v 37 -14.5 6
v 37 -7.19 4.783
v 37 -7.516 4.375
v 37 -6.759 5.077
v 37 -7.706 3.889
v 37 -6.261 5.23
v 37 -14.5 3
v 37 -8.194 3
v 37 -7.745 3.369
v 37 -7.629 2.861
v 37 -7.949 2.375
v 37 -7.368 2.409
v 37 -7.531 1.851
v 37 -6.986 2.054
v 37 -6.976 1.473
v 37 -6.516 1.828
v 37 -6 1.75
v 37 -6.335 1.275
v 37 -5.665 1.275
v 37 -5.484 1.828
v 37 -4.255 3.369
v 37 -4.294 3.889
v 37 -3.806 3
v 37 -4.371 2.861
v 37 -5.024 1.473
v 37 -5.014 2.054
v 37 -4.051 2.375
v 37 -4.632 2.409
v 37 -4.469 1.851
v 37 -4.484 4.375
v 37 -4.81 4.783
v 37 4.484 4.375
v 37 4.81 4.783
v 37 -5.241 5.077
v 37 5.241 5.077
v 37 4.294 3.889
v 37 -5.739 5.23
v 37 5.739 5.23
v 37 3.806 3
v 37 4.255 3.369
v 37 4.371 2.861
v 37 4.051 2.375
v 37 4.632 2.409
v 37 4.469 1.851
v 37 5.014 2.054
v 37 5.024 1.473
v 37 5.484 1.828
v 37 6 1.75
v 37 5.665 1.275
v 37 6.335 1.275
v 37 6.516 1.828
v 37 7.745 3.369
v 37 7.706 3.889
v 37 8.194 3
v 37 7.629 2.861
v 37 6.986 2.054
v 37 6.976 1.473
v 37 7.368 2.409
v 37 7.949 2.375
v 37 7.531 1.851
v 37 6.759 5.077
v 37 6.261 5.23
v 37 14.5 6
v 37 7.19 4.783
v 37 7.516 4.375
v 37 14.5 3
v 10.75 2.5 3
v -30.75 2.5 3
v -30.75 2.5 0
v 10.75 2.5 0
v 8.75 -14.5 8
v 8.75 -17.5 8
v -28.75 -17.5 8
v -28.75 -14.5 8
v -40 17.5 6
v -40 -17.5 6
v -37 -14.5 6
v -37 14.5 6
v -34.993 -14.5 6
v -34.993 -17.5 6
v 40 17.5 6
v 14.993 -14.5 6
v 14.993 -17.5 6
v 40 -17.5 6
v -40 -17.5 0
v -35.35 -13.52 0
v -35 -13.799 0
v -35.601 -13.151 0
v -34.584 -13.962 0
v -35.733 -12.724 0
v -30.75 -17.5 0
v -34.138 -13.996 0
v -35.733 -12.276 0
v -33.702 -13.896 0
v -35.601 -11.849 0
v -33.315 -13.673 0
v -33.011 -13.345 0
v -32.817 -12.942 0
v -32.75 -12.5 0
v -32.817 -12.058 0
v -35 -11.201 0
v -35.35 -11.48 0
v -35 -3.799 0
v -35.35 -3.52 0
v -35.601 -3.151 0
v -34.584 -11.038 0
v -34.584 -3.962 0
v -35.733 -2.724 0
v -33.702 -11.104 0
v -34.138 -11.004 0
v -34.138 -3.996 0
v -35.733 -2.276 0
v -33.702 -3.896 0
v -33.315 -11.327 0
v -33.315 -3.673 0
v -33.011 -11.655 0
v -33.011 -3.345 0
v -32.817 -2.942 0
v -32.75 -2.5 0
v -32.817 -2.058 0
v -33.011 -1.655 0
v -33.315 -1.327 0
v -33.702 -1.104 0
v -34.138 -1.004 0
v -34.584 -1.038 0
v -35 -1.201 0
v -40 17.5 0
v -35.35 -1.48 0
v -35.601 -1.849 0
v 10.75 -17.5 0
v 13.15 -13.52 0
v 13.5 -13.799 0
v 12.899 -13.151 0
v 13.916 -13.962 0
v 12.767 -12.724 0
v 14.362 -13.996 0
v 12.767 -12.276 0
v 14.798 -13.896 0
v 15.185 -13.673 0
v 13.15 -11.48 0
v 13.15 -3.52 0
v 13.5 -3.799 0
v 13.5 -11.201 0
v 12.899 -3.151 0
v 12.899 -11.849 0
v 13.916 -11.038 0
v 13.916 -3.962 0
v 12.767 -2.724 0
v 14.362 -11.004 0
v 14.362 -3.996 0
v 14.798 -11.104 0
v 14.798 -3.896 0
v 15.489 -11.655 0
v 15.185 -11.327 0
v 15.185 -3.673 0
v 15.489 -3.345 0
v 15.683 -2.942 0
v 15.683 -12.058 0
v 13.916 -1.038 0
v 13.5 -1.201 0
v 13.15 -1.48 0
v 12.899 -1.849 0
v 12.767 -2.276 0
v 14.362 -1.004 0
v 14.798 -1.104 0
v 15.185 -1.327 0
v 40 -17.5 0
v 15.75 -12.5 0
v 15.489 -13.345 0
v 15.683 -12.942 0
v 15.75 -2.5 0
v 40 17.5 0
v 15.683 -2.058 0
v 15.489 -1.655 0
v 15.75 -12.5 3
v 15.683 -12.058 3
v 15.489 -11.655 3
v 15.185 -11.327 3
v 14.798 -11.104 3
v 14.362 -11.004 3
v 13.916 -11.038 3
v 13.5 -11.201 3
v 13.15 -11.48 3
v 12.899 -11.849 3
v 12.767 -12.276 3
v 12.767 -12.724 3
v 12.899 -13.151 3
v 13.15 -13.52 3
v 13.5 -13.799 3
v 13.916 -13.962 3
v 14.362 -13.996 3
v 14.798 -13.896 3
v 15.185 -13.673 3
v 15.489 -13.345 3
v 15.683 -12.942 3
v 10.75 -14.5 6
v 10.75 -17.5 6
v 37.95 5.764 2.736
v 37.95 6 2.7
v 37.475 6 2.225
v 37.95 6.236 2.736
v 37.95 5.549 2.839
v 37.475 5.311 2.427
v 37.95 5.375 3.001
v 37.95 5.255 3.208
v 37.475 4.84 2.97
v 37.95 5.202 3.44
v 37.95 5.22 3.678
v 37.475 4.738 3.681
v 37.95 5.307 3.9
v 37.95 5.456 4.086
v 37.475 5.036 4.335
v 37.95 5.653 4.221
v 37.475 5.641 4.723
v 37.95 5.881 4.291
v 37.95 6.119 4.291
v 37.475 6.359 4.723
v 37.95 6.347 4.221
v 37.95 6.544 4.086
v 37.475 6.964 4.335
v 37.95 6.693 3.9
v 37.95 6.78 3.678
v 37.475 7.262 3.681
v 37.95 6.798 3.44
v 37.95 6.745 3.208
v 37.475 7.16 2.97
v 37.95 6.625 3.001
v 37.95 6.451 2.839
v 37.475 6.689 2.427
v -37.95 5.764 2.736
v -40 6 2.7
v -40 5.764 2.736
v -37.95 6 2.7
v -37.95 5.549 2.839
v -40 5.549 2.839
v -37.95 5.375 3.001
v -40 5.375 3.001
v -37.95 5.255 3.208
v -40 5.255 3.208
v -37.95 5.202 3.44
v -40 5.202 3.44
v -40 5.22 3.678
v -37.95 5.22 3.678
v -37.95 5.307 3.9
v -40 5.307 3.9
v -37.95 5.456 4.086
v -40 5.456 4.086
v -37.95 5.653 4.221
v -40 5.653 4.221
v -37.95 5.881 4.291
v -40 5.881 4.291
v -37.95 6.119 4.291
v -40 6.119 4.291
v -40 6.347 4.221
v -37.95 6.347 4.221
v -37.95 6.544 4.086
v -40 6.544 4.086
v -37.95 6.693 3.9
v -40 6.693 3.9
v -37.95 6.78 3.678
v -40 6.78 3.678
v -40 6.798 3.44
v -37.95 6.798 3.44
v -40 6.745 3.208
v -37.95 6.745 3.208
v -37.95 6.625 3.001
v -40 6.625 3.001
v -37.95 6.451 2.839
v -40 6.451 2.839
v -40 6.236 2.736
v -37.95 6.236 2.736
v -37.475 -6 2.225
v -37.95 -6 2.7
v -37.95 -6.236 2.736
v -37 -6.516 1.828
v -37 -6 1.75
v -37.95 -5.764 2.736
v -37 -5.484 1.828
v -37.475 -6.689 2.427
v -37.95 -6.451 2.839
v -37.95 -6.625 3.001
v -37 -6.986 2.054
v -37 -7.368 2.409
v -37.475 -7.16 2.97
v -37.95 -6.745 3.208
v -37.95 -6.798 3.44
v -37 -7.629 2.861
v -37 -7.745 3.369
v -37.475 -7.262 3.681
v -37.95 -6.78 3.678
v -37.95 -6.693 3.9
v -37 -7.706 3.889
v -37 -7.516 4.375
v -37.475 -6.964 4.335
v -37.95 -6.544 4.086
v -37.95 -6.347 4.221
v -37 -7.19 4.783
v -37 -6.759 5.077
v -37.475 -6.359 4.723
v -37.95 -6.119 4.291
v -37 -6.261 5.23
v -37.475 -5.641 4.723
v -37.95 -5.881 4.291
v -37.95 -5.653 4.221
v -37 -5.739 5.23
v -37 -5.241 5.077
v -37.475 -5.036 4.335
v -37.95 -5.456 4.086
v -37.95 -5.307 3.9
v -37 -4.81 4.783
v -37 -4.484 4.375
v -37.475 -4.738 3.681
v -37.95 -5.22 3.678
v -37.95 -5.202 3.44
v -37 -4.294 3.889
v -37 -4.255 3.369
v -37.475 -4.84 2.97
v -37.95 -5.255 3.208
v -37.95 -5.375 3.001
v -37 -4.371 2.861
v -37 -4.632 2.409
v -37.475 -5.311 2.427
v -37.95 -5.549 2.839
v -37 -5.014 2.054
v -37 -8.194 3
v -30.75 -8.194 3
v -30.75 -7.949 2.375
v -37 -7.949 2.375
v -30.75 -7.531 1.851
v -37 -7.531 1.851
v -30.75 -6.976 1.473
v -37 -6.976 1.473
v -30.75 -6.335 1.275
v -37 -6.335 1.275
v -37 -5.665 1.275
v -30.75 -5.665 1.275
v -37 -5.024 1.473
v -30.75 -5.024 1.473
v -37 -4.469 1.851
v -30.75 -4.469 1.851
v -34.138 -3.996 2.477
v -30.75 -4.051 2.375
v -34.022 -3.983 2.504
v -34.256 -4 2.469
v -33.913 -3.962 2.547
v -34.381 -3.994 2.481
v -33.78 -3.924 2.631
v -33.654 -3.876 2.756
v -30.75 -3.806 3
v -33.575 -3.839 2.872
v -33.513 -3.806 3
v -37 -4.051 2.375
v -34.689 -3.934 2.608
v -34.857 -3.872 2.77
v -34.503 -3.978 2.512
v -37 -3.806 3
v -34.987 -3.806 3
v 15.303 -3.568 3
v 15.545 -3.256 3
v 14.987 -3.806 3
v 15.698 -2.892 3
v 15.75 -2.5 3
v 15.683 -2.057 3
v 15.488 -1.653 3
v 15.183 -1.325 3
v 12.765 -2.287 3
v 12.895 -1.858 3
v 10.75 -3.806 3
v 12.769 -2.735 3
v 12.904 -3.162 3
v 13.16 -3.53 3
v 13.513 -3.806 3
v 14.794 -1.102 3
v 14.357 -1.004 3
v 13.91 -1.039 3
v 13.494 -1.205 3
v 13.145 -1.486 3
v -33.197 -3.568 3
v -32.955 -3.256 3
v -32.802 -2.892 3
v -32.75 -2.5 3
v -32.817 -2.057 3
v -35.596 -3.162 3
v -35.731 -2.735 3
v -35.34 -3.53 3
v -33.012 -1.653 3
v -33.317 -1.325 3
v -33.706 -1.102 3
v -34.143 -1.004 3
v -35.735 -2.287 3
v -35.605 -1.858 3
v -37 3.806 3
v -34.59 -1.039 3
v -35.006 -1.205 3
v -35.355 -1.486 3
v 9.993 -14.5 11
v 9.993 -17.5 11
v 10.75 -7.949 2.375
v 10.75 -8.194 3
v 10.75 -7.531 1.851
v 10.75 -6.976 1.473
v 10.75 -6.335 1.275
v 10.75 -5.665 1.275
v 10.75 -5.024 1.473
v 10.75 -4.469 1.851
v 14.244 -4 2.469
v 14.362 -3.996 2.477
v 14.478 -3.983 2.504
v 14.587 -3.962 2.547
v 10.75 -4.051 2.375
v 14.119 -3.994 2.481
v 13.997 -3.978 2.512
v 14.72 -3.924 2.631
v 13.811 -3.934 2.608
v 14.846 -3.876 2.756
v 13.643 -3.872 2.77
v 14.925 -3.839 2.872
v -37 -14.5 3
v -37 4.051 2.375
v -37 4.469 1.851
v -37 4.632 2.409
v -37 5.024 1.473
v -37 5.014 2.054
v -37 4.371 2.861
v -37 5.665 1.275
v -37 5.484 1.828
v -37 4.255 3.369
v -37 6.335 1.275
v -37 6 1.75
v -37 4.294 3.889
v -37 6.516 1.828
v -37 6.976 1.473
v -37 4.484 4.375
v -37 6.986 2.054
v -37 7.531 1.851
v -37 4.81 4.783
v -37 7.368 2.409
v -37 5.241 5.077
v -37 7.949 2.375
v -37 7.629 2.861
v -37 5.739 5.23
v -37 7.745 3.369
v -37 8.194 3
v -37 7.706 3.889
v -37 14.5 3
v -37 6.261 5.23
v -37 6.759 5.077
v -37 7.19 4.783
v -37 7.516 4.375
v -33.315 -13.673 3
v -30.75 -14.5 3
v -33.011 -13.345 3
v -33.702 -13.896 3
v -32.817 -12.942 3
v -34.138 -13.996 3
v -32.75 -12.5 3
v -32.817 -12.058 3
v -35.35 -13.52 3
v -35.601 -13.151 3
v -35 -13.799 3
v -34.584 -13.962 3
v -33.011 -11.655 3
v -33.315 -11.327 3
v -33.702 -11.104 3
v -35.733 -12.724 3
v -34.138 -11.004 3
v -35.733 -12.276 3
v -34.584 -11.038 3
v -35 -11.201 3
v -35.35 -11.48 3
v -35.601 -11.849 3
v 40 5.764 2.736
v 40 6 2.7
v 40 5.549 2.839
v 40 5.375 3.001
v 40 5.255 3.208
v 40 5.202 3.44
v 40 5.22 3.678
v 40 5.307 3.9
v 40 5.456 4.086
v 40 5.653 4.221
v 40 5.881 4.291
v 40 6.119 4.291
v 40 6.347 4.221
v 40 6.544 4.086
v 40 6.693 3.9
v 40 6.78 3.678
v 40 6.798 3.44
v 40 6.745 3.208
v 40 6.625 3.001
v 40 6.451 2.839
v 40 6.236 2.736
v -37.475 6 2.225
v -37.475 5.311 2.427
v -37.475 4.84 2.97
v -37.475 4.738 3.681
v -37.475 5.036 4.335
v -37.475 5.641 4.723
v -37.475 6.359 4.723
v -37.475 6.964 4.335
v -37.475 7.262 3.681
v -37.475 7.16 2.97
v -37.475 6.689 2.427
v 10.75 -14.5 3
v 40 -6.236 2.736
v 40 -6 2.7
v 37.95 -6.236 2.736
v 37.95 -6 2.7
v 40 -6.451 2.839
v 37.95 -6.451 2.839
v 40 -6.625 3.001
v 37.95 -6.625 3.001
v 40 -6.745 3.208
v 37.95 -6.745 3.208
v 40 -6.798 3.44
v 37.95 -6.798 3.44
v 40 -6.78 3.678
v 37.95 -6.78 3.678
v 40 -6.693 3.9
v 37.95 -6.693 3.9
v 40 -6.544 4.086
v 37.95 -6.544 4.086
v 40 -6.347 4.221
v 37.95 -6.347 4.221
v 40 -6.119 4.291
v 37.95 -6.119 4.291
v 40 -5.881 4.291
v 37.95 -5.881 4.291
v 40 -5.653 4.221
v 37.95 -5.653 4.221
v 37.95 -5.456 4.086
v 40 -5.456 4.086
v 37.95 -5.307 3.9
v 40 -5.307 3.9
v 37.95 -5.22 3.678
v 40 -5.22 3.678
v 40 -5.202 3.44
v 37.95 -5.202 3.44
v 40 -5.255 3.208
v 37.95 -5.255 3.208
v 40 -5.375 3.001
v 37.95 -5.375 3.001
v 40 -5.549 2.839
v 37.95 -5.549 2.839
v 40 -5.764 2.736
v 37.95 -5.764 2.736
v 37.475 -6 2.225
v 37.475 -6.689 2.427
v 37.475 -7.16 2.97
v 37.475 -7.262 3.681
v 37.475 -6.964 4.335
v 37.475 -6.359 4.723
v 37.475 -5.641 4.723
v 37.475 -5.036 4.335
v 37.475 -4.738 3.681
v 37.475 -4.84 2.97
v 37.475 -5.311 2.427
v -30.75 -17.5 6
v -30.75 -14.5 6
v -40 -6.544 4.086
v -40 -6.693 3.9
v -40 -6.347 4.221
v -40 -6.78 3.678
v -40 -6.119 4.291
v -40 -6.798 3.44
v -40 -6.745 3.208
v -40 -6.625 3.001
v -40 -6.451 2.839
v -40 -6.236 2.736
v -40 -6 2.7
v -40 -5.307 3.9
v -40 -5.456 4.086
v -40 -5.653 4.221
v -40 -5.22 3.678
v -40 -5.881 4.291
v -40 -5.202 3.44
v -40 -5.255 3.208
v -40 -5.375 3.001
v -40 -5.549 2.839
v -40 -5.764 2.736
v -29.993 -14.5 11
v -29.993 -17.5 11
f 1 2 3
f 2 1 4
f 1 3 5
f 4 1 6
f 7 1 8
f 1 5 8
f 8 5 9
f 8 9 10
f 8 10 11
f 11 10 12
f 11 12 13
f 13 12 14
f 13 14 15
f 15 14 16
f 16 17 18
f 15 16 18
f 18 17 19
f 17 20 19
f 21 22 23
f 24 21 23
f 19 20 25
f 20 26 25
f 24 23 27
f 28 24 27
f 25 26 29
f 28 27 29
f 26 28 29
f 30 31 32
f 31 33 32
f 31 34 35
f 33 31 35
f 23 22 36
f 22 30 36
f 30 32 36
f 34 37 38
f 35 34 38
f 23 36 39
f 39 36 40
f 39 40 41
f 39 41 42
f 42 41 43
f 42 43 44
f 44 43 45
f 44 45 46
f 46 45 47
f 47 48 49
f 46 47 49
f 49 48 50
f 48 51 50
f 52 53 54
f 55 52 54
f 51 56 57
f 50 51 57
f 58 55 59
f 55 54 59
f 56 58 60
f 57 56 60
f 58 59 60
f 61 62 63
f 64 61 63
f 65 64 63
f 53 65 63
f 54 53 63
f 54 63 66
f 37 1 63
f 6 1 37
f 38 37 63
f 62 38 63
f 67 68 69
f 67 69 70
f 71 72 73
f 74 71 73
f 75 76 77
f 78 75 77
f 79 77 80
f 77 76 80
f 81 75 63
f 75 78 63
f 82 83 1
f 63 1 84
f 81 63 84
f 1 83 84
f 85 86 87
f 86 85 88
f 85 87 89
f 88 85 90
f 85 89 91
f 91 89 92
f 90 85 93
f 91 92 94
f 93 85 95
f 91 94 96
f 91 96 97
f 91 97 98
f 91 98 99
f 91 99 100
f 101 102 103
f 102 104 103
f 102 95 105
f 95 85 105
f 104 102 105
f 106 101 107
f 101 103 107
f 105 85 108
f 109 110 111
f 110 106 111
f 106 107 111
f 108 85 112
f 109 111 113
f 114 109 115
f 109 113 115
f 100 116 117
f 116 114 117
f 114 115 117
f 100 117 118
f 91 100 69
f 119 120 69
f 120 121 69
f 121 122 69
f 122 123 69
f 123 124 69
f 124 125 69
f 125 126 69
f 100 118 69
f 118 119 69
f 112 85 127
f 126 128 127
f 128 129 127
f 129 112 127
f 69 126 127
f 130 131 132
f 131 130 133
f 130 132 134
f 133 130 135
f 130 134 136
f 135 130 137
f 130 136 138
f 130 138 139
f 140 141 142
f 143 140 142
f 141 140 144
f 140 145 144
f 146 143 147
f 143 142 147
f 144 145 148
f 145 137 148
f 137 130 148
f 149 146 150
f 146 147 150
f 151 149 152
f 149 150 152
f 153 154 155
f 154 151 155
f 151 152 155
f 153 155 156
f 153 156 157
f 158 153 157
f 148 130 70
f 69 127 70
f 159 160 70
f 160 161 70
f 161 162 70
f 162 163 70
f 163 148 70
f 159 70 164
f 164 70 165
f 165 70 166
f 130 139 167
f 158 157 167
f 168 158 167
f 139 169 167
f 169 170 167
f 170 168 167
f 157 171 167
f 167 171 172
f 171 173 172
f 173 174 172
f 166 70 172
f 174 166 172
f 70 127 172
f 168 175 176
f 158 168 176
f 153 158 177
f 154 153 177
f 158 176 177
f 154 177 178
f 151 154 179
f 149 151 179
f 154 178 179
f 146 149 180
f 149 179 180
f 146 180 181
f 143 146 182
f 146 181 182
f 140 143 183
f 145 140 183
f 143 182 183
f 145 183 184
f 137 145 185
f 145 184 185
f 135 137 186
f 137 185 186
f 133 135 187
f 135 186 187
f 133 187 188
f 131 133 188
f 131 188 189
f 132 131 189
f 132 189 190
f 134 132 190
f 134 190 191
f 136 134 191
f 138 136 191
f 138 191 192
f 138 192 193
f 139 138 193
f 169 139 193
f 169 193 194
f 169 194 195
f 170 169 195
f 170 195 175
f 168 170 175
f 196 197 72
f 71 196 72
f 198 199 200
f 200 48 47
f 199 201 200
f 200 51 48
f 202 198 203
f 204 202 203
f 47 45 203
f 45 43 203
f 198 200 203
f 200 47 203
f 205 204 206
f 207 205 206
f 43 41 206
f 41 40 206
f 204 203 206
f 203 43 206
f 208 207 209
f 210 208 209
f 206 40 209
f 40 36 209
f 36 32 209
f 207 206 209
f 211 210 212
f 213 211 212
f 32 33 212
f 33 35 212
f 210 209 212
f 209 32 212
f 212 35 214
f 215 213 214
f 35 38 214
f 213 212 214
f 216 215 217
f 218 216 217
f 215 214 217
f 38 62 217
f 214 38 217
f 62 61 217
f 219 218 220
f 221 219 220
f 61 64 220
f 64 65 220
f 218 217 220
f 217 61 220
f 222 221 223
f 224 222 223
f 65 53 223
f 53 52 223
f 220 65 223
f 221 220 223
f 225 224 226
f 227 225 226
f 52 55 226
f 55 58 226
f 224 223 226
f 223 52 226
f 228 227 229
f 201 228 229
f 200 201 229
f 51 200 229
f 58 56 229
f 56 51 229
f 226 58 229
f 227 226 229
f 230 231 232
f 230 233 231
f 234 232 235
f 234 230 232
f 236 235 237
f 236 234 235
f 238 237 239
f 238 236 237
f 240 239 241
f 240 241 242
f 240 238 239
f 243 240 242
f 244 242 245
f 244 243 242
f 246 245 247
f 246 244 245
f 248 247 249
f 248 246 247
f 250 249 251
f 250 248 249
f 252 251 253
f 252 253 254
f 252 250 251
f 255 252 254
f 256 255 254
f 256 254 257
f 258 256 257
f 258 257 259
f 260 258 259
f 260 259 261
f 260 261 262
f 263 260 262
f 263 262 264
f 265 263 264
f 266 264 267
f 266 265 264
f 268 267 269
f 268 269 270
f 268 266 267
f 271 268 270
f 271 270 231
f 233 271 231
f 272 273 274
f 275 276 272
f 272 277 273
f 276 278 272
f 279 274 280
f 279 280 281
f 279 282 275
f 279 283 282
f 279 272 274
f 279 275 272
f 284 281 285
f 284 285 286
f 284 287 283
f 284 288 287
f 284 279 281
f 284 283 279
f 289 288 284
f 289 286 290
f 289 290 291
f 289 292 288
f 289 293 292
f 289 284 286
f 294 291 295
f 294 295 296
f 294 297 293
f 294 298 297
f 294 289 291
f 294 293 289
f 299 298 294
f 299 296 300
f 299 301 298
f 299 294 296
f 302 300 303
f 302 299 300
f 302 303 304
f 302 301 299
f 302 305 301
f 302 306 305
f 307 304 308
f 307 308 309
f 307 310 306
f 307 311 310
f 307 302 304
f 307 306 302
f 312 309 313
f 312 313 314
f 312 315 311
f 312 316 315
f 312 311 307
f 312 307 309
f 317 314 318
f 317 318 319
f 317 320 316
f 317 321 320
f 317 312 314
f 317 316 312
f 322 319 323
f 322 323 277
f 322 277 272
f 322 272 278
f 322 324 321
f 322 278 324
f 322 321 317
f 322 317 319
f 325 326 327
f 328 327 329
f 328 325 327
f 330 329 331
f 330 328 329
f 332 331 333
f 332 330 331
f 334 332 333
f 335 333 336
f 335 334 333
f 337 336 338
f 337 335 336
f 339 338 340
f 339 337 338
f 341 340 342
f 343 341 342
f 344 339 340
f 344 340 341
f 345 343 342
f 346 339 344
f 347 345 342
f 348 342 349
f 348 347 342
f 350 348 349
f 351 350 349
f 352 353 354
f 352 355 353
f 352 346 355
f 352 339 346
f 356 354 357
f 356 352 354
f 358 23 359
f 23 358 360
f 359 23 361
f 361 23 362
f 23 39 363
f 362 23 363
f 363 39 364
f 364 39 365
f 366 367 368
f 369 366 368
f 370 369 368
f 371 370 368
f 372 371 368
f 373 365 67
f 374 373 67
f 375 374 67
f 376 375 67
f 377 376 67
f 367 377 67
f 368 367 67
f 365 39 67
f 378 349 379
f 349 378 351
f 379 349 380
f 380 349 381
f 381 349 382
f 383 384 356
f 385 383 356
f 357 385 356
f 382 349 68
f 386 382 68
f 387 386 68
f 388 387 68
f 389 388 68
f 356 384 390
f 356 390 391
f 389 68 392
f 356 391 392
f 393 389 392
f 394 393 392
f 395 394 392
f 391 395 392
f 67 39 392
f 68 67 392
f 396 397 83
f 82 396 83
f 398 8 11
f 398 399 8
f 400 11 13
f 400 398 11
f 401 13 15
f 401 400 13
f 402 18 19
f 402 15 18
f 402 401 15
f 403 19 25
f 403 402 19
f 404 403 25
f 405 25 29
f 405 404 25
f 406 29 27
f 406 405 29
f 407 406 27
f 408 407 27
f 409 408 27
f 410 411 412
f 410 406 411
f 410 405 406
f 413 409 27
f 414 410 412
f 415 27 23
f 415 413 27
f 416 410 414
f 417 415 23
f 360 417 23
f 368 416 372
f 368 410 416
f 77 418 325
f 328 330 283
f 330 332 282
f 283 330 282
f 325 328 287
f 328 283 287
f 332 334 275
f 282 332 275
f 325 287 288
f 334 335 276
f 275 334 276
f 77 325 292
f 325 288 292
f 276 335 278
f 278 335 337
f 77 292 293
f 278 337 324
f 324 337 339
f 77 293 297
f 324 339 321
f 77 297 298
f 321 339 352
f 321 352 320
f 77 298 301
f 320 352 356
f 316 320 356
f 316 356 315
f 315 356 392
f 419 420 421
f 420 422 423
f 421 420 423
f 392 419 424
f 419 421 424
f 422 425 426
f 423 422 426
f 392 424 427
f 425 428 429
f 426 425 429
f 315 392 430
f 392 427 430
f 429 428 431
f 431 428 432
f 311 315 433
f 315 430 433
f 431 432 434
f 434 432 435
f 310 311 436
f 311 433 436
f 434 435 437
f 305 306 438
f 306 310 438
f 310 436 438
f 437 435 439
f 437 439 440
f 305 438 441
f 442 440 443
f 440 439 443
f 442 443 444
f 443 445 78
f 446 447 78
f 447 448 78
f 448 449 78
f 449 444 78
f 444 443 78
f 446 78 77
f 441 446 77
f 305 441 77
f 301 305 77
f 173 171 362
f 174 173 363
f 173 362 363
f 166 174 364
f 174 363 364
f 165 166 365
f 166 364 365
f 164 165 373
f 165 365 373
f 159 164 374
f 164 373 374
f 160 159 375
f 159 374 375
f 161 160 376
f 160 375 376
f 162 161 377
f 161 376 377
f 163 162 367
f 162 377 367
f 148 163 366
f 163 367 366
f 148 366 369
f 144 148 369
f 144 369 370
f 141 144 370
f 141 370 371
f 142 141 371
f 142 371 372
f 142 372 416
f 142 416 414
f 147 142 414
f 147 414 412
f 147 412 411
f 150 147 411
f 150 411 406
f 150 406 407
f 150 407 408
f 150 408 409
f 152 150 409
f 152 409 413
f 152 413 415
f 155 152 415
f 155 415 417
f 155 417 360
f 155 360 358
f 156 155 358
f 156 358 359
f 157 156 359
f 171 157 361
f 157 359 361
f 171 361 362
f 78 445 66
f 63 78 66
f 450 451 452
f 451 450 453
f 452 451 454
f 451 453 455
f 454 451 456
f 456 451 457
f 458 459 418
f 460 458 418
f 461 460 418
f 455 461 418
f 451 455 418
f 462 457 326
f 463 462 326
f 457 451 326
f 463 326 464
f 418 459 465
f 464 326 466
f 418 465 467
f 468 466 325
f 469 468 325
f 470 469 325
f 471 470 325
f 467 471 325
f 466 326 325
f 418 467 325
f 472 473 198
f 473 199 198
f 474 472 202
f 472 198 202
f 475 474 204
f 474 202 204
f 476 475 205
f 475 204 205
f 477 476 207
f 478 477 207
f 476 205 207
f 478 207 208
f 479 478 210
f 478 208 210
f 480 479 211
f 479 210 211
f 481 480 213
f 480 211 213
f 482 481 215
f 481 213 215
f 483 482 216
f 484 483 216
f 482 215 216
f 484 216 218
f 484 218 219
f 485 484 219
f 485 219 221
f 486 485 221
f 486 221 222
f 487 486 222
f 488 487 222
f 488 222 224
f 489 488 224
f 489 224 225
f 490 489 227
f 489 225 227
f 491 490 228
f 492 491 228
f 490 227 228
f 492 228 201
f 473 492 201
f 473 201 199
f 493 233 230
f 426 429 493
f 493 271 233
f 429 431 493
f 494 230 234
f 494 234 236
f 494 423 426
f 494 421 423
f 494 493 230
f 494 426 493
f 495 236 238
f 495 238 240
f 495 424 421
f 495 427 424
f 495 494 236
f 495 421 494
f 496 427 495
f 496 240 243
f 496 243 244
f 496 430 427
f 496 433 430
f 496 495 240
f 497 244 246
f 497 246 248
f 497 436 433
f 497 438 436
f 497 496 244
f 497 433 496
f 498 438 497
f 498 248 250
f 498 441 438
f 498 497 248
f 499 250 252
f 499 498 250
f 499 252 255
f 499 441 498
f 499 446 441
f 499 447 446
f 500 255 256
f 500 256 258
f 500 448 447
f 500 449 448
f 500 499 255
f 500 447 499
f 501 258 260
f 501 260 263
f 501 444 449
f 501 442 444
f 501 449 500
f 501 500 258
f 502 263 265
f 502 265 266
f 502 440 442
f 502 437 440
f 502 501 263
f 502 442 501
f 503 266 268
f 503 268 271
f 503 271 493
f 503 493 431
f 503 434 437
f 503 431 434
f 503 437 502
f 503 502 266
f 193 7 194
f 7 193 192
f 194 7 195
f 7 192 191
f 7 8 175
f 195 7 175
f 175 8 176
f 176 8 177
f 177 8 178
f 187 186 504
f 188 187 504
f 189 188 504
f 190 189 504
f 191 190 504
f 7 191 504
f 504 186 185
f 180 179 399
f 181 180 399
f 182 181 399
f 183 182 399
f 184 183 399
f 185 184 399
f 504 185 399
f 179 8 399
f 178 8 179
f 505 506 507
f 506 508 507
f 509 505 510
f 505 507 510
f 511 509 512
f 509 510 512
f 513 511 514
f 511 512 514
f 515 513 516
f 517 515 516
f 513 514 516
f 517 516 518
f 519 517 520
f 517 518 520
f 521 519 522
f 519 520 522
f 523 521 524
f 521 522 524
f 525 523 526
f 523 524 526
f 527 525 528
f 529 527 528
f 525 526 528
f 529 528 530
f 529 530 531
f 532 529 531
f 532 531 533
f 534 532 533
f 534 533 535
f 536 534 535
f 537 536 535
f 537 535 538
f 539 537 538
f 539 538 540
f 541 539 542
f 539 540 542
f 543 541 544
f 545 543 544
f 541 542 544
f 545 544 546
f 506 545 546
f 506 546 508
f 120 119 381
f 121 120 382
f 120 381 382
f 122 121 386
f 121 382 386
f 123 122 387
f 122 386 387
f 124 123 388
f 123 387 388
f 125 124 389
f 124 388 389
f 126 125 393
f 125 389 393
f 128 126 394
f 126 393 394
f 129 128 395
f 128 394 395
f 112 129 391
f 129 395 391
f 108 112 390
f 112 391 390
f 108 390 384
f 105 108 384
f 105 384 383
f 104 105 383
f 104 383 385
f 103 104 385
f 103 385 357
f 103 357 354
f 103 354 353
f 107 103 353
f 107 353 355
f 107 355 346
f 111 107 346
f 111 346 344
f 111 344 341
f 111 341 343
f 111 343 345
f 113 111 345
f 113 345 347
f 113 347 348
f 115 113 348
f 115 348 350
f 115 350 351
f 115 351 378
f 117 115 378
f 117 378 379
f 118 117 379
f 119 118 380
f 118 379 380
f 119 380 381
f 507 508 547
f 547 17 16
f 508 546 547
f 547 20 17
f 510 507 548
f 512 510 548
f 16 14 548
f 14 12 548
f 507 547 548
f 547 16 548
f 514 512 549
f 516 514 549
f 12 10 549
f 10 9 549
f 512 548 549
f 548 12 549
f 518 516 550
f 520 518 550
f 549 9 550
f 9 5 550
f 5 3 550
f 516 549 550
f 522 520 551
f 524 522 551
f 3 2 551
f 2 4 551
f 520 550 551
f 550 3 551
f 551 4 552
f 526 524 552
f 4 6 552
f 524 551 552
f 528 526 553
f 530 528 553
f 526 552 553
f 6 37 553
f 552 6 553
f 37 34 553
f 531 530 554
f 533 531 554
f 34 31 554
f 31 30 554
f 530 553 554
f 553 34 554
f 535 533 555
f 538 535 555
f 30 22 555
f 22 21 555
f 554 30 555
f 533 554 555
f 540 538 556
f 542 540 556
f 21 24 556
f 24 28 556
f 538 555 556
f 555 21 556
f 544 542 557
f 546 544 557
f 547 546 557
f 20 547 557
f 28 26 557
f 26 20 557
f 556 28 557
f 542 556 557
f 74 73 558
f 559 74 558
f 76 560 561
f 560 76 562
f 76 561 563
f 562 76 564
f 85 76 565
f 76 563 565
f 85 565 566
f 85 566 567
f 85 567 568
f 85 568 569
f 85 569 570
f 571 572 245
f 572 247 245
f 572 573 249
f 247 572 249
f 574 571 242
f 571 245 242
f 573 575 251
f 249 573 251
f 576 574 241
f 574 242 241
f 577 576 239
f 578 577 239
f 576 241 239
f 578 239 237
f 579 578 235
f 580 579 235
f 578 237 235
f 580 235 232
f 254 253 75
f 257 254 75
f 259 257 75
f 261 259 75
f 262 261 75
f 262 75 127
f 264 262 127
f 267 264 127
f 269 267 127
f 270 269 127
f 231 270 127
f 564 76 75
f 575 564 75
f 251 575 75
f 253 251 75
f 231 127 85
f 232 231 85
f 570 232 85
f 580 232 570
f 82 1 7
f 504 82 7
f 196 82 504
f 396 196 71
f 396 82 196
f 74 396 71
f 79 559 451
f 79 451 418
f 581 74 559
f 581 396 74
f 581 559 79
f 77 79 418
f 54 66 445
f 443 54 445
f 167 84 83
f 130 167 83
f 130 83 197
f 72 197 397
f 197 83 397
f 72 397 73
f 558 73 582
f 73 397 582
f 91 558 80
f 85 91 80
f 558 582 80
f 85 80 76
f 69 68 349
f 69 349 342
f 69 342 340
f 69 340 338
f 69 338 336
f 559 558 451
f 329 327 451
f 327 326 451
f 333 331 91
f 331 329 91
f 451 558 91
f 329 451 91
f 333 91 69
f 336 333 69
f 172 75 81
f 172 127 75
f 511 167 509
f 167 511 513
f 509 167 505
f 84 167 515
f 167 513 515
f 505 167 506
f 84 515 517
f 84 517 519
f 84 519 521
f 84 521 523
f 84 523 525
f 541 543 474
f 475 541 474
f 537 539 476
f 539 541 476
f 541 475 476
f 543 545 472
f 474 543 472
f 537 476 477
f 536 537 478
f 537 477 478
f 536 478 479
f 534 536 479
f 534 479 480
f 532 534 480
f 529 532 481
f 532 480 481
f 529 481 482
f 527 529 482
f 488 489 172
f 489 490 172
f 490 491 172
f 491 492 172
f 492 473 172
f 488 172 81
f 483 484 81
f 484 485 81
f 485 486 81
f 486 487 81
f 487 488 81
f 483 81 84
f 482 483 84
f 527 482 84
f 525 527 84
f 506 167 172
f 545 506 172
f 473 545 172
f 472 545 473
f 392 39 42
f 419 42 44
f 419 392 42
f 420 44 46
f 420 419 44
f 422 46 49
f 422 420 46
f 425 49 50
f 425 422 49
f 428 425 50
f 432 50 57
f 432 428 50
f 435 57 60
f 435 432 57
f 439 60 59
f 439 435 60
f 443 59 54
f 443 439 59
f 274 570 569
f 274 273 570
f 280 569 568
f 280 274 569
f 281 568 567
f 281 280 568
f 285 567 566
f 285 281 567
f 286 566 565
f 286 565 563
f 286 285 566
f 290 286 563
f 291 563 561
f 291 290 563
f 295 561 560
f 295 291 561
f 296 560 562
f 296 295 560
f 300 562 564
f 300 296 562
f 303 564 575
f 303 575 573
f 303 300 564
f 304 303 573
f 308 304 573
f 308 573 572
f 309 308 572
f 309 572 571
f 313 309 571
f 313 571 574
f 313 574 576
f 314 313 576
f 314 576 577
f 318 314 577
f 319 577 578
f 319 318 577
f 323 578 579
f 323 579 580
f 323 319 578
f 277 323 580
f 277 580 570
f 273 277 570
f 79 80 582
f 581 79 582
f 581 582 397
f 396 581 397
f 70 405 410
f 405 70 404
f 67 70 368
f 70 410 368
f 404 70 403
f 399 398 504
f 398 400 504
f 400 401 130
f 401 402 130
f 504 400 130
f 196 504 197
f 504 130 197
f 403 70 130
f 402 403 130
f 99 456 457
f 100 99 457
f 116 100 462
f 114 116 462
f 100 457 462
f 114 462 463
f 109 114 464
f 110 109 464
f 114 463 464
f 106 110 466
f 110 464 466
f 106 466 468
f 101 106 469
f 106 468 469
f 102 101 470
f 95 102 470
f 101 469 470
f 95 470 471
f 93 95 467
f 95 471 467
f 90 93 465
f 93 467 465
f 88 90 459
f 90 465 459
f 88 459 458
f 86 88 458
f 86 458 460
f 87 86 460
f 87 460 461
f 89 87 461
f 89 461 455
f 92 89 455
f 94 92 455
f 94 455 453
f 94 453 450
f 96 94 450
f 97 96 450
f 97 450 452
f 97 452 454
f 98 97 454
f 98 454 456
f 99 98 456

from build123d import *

# Parameters (mm, degrees)
AUFSATZ_LINEAR_AUSTRAGEN2_DEPTH             = 17.5
SKIZZE3_R                                   = 1.5
SKIZZE3_W                                   = 41.5
SKIZZE3_H                                   = 20
SCHNITT_LINEAR_AUSTRAGEN1_DEPTH             = 4
SKIZZE4_W                                   = 74
SKIZZE4_H                                   = 3
AUFSATZ_LINEAR_AUSTRAGEN3_DEPTH             = 3
AUFSATZ_LINEAR_AUSTRAGEN4_DEPTH             = 3
FORMSENKUNG_F_R_M3_SENKSCHRAUBE_MIT_2_COUNT = 2
FORMSENKUNG_F_R_M3_SENKSCHRAUBE_MIT_2_PITCH = 12
SKIZZE8_R                                   = 2.25
SCHNITT_LINEAR_AUSTRAGEN2_DEPTH             = 74


with BuildPart() as part:
    # Skizze2 → Aufsatz-Linear austragen2 (new body, symmetric)
    with BuildSketch(Plane(origin=(0, 0, 0), x_dir=(1, 0, 0), z_dir=(0, 1, 0))):
        Polygon((-40, 0), (40, 0), (40, -6), (37, -6), (37, -3), (-37, -3), (-37, -6), (-40, -6), align=None)
    extrude(amount=AUFSATZ_LINEAR_AUSTRAGEN2_DEPTH, both=True)

    # Skizze3 → Schnitt-Linear austragen1 (cut, through all)
    with BuildSketch(Plane.XY.offset(3)):
        with Locations((-34.25, -2.5)):
            Circle(SKIZZE3_R)
        with Locations((-34.25, -12.5)):
            Circle(SKIZZE3_R)
        with Locations((14.25, -2.5)):
            Circle(SKIZZE3_R)
        with Locations((14.25, -12.5)):
            Circle(SKIZZE3_R)
        with Locations((-10, -7.5)):
            Rectangle(SKIZZE3_W, SKIZZE3_H)
    extrude(amount=-SCHNITT_LINEAR_AUSTRAGEN1_DEPTH, mode=Mode.SUBTRACT)

    # Skizze4 → Aufsatz-Linear austragen3 (add)
    with BuildSketch(Plane.XY.offset(3)):
        with Locations((0, 16)):
            Rectangle(SKIZZE4_W, SKIZZE4_H)
    extrude(amount=AUFSATZ_LINEAR_AUSTRAGEN3_DEPTH)

    # Skizze5 → Aufsatz-Linear austragen4 (add)
    with BuildSketch(Plane.XZ.offset(17.5)):
        Polygon((-37, 6), (-34.992640687, 6), (-29.992640687, 11), (9.992640687, 11), (14.992640687, 6), (37, 6), (37, 3), (10.75, 3), (10.75, 6), (8.75, 8), (-28.75, 8), (-30.75, 6), (-30.75, 3), (-37, 3), align=None)
    extrude(amount=-AUFSATZ_LINEAR_AUSTRAGEN4_DEPTH)

    # Skizze6 → Formsenkung für M3 Senkschraube mit Innensechskant1 (revolve, cut)
    with BuildSketch(Plane(origin=(-37, 6, 3.5), x_dir=(0, 0, -1), z_dir=(0, 1, 0))):
        Polygon((0, 0), (0, 3), (0.8, 3), (0.8, 0.95), (1.75, 0), align=None)
    formsenkung_f_r_m3_senkschraube_mit_inne = revolve(axis=Axis((-30.65, 6, 3.5), (-1, 0, 0)), mode=Mode.SUBTRACT)

    # Formsenkung f_r M3 Senkschraube mit  2: Formsenkung für M3 Senkschraube mit Innensechskant1 ×2
    with Locations(*[(0, -i * FORMSENKUNG_F_R_M3_SENKSCHRAUBE_MIT_2_PITCH, 0) for i in range(1, FORMSENKUNG_F_R_M3_SENKSCHRAUBE_MIT_2_COUNT)]):
        add(formsenkung_f_r_m3_senkschraube_mit_inne, mode=Mode.SUBTRACT)

    # Skizze8 → Schnitt-Linear austragen2 (cut)
    with BuildSketch(Plane(origin=(-37, 0, 0), x_dir=(0, 0, -1), z_dir=(1, 0, 0))):
        with Locations((-3.5, -6)):
            Circle(SKIZZE8_R)
        with Locations((-3.5, 6)):
            Circle(SKIZZE8_R)
    extrude(amount=SCHNITT_LINEAR_AUSTRAGEN2_DEPTH, mode=Mode.SUBTRACT)

    # Spiegeln2: Formsenkung für M3 Senkschraube mit Innensechskant1 across plane
    add(formsenkung_f_r_m3_senkschraube_mit_inne.mirror(Plane(origin=(0, 0, 0), x_dir=(0, 0, 1), z_dir=(1, 0, 0))), mode=Mode.SUBTRACT)

    # Spiegeln2 copy 1 sketch → Spiegeln2 copy 1 (revolve, cut)
    with BuildSketch(Plane(origin=(37, -6, 3.5), x_dir=(0, 0, -1), z_dir=(0, 1, 0))):
        Polygon((0, 0), (0, -3), (0.8, -3), (0.8, -0.95), (1.75, 0), align=None)
    revolve(axis=Axis((30.65, -6, 3.5), (-1, 0, 0)), mode=Mode.SUBTRACT)


solid = part.part
